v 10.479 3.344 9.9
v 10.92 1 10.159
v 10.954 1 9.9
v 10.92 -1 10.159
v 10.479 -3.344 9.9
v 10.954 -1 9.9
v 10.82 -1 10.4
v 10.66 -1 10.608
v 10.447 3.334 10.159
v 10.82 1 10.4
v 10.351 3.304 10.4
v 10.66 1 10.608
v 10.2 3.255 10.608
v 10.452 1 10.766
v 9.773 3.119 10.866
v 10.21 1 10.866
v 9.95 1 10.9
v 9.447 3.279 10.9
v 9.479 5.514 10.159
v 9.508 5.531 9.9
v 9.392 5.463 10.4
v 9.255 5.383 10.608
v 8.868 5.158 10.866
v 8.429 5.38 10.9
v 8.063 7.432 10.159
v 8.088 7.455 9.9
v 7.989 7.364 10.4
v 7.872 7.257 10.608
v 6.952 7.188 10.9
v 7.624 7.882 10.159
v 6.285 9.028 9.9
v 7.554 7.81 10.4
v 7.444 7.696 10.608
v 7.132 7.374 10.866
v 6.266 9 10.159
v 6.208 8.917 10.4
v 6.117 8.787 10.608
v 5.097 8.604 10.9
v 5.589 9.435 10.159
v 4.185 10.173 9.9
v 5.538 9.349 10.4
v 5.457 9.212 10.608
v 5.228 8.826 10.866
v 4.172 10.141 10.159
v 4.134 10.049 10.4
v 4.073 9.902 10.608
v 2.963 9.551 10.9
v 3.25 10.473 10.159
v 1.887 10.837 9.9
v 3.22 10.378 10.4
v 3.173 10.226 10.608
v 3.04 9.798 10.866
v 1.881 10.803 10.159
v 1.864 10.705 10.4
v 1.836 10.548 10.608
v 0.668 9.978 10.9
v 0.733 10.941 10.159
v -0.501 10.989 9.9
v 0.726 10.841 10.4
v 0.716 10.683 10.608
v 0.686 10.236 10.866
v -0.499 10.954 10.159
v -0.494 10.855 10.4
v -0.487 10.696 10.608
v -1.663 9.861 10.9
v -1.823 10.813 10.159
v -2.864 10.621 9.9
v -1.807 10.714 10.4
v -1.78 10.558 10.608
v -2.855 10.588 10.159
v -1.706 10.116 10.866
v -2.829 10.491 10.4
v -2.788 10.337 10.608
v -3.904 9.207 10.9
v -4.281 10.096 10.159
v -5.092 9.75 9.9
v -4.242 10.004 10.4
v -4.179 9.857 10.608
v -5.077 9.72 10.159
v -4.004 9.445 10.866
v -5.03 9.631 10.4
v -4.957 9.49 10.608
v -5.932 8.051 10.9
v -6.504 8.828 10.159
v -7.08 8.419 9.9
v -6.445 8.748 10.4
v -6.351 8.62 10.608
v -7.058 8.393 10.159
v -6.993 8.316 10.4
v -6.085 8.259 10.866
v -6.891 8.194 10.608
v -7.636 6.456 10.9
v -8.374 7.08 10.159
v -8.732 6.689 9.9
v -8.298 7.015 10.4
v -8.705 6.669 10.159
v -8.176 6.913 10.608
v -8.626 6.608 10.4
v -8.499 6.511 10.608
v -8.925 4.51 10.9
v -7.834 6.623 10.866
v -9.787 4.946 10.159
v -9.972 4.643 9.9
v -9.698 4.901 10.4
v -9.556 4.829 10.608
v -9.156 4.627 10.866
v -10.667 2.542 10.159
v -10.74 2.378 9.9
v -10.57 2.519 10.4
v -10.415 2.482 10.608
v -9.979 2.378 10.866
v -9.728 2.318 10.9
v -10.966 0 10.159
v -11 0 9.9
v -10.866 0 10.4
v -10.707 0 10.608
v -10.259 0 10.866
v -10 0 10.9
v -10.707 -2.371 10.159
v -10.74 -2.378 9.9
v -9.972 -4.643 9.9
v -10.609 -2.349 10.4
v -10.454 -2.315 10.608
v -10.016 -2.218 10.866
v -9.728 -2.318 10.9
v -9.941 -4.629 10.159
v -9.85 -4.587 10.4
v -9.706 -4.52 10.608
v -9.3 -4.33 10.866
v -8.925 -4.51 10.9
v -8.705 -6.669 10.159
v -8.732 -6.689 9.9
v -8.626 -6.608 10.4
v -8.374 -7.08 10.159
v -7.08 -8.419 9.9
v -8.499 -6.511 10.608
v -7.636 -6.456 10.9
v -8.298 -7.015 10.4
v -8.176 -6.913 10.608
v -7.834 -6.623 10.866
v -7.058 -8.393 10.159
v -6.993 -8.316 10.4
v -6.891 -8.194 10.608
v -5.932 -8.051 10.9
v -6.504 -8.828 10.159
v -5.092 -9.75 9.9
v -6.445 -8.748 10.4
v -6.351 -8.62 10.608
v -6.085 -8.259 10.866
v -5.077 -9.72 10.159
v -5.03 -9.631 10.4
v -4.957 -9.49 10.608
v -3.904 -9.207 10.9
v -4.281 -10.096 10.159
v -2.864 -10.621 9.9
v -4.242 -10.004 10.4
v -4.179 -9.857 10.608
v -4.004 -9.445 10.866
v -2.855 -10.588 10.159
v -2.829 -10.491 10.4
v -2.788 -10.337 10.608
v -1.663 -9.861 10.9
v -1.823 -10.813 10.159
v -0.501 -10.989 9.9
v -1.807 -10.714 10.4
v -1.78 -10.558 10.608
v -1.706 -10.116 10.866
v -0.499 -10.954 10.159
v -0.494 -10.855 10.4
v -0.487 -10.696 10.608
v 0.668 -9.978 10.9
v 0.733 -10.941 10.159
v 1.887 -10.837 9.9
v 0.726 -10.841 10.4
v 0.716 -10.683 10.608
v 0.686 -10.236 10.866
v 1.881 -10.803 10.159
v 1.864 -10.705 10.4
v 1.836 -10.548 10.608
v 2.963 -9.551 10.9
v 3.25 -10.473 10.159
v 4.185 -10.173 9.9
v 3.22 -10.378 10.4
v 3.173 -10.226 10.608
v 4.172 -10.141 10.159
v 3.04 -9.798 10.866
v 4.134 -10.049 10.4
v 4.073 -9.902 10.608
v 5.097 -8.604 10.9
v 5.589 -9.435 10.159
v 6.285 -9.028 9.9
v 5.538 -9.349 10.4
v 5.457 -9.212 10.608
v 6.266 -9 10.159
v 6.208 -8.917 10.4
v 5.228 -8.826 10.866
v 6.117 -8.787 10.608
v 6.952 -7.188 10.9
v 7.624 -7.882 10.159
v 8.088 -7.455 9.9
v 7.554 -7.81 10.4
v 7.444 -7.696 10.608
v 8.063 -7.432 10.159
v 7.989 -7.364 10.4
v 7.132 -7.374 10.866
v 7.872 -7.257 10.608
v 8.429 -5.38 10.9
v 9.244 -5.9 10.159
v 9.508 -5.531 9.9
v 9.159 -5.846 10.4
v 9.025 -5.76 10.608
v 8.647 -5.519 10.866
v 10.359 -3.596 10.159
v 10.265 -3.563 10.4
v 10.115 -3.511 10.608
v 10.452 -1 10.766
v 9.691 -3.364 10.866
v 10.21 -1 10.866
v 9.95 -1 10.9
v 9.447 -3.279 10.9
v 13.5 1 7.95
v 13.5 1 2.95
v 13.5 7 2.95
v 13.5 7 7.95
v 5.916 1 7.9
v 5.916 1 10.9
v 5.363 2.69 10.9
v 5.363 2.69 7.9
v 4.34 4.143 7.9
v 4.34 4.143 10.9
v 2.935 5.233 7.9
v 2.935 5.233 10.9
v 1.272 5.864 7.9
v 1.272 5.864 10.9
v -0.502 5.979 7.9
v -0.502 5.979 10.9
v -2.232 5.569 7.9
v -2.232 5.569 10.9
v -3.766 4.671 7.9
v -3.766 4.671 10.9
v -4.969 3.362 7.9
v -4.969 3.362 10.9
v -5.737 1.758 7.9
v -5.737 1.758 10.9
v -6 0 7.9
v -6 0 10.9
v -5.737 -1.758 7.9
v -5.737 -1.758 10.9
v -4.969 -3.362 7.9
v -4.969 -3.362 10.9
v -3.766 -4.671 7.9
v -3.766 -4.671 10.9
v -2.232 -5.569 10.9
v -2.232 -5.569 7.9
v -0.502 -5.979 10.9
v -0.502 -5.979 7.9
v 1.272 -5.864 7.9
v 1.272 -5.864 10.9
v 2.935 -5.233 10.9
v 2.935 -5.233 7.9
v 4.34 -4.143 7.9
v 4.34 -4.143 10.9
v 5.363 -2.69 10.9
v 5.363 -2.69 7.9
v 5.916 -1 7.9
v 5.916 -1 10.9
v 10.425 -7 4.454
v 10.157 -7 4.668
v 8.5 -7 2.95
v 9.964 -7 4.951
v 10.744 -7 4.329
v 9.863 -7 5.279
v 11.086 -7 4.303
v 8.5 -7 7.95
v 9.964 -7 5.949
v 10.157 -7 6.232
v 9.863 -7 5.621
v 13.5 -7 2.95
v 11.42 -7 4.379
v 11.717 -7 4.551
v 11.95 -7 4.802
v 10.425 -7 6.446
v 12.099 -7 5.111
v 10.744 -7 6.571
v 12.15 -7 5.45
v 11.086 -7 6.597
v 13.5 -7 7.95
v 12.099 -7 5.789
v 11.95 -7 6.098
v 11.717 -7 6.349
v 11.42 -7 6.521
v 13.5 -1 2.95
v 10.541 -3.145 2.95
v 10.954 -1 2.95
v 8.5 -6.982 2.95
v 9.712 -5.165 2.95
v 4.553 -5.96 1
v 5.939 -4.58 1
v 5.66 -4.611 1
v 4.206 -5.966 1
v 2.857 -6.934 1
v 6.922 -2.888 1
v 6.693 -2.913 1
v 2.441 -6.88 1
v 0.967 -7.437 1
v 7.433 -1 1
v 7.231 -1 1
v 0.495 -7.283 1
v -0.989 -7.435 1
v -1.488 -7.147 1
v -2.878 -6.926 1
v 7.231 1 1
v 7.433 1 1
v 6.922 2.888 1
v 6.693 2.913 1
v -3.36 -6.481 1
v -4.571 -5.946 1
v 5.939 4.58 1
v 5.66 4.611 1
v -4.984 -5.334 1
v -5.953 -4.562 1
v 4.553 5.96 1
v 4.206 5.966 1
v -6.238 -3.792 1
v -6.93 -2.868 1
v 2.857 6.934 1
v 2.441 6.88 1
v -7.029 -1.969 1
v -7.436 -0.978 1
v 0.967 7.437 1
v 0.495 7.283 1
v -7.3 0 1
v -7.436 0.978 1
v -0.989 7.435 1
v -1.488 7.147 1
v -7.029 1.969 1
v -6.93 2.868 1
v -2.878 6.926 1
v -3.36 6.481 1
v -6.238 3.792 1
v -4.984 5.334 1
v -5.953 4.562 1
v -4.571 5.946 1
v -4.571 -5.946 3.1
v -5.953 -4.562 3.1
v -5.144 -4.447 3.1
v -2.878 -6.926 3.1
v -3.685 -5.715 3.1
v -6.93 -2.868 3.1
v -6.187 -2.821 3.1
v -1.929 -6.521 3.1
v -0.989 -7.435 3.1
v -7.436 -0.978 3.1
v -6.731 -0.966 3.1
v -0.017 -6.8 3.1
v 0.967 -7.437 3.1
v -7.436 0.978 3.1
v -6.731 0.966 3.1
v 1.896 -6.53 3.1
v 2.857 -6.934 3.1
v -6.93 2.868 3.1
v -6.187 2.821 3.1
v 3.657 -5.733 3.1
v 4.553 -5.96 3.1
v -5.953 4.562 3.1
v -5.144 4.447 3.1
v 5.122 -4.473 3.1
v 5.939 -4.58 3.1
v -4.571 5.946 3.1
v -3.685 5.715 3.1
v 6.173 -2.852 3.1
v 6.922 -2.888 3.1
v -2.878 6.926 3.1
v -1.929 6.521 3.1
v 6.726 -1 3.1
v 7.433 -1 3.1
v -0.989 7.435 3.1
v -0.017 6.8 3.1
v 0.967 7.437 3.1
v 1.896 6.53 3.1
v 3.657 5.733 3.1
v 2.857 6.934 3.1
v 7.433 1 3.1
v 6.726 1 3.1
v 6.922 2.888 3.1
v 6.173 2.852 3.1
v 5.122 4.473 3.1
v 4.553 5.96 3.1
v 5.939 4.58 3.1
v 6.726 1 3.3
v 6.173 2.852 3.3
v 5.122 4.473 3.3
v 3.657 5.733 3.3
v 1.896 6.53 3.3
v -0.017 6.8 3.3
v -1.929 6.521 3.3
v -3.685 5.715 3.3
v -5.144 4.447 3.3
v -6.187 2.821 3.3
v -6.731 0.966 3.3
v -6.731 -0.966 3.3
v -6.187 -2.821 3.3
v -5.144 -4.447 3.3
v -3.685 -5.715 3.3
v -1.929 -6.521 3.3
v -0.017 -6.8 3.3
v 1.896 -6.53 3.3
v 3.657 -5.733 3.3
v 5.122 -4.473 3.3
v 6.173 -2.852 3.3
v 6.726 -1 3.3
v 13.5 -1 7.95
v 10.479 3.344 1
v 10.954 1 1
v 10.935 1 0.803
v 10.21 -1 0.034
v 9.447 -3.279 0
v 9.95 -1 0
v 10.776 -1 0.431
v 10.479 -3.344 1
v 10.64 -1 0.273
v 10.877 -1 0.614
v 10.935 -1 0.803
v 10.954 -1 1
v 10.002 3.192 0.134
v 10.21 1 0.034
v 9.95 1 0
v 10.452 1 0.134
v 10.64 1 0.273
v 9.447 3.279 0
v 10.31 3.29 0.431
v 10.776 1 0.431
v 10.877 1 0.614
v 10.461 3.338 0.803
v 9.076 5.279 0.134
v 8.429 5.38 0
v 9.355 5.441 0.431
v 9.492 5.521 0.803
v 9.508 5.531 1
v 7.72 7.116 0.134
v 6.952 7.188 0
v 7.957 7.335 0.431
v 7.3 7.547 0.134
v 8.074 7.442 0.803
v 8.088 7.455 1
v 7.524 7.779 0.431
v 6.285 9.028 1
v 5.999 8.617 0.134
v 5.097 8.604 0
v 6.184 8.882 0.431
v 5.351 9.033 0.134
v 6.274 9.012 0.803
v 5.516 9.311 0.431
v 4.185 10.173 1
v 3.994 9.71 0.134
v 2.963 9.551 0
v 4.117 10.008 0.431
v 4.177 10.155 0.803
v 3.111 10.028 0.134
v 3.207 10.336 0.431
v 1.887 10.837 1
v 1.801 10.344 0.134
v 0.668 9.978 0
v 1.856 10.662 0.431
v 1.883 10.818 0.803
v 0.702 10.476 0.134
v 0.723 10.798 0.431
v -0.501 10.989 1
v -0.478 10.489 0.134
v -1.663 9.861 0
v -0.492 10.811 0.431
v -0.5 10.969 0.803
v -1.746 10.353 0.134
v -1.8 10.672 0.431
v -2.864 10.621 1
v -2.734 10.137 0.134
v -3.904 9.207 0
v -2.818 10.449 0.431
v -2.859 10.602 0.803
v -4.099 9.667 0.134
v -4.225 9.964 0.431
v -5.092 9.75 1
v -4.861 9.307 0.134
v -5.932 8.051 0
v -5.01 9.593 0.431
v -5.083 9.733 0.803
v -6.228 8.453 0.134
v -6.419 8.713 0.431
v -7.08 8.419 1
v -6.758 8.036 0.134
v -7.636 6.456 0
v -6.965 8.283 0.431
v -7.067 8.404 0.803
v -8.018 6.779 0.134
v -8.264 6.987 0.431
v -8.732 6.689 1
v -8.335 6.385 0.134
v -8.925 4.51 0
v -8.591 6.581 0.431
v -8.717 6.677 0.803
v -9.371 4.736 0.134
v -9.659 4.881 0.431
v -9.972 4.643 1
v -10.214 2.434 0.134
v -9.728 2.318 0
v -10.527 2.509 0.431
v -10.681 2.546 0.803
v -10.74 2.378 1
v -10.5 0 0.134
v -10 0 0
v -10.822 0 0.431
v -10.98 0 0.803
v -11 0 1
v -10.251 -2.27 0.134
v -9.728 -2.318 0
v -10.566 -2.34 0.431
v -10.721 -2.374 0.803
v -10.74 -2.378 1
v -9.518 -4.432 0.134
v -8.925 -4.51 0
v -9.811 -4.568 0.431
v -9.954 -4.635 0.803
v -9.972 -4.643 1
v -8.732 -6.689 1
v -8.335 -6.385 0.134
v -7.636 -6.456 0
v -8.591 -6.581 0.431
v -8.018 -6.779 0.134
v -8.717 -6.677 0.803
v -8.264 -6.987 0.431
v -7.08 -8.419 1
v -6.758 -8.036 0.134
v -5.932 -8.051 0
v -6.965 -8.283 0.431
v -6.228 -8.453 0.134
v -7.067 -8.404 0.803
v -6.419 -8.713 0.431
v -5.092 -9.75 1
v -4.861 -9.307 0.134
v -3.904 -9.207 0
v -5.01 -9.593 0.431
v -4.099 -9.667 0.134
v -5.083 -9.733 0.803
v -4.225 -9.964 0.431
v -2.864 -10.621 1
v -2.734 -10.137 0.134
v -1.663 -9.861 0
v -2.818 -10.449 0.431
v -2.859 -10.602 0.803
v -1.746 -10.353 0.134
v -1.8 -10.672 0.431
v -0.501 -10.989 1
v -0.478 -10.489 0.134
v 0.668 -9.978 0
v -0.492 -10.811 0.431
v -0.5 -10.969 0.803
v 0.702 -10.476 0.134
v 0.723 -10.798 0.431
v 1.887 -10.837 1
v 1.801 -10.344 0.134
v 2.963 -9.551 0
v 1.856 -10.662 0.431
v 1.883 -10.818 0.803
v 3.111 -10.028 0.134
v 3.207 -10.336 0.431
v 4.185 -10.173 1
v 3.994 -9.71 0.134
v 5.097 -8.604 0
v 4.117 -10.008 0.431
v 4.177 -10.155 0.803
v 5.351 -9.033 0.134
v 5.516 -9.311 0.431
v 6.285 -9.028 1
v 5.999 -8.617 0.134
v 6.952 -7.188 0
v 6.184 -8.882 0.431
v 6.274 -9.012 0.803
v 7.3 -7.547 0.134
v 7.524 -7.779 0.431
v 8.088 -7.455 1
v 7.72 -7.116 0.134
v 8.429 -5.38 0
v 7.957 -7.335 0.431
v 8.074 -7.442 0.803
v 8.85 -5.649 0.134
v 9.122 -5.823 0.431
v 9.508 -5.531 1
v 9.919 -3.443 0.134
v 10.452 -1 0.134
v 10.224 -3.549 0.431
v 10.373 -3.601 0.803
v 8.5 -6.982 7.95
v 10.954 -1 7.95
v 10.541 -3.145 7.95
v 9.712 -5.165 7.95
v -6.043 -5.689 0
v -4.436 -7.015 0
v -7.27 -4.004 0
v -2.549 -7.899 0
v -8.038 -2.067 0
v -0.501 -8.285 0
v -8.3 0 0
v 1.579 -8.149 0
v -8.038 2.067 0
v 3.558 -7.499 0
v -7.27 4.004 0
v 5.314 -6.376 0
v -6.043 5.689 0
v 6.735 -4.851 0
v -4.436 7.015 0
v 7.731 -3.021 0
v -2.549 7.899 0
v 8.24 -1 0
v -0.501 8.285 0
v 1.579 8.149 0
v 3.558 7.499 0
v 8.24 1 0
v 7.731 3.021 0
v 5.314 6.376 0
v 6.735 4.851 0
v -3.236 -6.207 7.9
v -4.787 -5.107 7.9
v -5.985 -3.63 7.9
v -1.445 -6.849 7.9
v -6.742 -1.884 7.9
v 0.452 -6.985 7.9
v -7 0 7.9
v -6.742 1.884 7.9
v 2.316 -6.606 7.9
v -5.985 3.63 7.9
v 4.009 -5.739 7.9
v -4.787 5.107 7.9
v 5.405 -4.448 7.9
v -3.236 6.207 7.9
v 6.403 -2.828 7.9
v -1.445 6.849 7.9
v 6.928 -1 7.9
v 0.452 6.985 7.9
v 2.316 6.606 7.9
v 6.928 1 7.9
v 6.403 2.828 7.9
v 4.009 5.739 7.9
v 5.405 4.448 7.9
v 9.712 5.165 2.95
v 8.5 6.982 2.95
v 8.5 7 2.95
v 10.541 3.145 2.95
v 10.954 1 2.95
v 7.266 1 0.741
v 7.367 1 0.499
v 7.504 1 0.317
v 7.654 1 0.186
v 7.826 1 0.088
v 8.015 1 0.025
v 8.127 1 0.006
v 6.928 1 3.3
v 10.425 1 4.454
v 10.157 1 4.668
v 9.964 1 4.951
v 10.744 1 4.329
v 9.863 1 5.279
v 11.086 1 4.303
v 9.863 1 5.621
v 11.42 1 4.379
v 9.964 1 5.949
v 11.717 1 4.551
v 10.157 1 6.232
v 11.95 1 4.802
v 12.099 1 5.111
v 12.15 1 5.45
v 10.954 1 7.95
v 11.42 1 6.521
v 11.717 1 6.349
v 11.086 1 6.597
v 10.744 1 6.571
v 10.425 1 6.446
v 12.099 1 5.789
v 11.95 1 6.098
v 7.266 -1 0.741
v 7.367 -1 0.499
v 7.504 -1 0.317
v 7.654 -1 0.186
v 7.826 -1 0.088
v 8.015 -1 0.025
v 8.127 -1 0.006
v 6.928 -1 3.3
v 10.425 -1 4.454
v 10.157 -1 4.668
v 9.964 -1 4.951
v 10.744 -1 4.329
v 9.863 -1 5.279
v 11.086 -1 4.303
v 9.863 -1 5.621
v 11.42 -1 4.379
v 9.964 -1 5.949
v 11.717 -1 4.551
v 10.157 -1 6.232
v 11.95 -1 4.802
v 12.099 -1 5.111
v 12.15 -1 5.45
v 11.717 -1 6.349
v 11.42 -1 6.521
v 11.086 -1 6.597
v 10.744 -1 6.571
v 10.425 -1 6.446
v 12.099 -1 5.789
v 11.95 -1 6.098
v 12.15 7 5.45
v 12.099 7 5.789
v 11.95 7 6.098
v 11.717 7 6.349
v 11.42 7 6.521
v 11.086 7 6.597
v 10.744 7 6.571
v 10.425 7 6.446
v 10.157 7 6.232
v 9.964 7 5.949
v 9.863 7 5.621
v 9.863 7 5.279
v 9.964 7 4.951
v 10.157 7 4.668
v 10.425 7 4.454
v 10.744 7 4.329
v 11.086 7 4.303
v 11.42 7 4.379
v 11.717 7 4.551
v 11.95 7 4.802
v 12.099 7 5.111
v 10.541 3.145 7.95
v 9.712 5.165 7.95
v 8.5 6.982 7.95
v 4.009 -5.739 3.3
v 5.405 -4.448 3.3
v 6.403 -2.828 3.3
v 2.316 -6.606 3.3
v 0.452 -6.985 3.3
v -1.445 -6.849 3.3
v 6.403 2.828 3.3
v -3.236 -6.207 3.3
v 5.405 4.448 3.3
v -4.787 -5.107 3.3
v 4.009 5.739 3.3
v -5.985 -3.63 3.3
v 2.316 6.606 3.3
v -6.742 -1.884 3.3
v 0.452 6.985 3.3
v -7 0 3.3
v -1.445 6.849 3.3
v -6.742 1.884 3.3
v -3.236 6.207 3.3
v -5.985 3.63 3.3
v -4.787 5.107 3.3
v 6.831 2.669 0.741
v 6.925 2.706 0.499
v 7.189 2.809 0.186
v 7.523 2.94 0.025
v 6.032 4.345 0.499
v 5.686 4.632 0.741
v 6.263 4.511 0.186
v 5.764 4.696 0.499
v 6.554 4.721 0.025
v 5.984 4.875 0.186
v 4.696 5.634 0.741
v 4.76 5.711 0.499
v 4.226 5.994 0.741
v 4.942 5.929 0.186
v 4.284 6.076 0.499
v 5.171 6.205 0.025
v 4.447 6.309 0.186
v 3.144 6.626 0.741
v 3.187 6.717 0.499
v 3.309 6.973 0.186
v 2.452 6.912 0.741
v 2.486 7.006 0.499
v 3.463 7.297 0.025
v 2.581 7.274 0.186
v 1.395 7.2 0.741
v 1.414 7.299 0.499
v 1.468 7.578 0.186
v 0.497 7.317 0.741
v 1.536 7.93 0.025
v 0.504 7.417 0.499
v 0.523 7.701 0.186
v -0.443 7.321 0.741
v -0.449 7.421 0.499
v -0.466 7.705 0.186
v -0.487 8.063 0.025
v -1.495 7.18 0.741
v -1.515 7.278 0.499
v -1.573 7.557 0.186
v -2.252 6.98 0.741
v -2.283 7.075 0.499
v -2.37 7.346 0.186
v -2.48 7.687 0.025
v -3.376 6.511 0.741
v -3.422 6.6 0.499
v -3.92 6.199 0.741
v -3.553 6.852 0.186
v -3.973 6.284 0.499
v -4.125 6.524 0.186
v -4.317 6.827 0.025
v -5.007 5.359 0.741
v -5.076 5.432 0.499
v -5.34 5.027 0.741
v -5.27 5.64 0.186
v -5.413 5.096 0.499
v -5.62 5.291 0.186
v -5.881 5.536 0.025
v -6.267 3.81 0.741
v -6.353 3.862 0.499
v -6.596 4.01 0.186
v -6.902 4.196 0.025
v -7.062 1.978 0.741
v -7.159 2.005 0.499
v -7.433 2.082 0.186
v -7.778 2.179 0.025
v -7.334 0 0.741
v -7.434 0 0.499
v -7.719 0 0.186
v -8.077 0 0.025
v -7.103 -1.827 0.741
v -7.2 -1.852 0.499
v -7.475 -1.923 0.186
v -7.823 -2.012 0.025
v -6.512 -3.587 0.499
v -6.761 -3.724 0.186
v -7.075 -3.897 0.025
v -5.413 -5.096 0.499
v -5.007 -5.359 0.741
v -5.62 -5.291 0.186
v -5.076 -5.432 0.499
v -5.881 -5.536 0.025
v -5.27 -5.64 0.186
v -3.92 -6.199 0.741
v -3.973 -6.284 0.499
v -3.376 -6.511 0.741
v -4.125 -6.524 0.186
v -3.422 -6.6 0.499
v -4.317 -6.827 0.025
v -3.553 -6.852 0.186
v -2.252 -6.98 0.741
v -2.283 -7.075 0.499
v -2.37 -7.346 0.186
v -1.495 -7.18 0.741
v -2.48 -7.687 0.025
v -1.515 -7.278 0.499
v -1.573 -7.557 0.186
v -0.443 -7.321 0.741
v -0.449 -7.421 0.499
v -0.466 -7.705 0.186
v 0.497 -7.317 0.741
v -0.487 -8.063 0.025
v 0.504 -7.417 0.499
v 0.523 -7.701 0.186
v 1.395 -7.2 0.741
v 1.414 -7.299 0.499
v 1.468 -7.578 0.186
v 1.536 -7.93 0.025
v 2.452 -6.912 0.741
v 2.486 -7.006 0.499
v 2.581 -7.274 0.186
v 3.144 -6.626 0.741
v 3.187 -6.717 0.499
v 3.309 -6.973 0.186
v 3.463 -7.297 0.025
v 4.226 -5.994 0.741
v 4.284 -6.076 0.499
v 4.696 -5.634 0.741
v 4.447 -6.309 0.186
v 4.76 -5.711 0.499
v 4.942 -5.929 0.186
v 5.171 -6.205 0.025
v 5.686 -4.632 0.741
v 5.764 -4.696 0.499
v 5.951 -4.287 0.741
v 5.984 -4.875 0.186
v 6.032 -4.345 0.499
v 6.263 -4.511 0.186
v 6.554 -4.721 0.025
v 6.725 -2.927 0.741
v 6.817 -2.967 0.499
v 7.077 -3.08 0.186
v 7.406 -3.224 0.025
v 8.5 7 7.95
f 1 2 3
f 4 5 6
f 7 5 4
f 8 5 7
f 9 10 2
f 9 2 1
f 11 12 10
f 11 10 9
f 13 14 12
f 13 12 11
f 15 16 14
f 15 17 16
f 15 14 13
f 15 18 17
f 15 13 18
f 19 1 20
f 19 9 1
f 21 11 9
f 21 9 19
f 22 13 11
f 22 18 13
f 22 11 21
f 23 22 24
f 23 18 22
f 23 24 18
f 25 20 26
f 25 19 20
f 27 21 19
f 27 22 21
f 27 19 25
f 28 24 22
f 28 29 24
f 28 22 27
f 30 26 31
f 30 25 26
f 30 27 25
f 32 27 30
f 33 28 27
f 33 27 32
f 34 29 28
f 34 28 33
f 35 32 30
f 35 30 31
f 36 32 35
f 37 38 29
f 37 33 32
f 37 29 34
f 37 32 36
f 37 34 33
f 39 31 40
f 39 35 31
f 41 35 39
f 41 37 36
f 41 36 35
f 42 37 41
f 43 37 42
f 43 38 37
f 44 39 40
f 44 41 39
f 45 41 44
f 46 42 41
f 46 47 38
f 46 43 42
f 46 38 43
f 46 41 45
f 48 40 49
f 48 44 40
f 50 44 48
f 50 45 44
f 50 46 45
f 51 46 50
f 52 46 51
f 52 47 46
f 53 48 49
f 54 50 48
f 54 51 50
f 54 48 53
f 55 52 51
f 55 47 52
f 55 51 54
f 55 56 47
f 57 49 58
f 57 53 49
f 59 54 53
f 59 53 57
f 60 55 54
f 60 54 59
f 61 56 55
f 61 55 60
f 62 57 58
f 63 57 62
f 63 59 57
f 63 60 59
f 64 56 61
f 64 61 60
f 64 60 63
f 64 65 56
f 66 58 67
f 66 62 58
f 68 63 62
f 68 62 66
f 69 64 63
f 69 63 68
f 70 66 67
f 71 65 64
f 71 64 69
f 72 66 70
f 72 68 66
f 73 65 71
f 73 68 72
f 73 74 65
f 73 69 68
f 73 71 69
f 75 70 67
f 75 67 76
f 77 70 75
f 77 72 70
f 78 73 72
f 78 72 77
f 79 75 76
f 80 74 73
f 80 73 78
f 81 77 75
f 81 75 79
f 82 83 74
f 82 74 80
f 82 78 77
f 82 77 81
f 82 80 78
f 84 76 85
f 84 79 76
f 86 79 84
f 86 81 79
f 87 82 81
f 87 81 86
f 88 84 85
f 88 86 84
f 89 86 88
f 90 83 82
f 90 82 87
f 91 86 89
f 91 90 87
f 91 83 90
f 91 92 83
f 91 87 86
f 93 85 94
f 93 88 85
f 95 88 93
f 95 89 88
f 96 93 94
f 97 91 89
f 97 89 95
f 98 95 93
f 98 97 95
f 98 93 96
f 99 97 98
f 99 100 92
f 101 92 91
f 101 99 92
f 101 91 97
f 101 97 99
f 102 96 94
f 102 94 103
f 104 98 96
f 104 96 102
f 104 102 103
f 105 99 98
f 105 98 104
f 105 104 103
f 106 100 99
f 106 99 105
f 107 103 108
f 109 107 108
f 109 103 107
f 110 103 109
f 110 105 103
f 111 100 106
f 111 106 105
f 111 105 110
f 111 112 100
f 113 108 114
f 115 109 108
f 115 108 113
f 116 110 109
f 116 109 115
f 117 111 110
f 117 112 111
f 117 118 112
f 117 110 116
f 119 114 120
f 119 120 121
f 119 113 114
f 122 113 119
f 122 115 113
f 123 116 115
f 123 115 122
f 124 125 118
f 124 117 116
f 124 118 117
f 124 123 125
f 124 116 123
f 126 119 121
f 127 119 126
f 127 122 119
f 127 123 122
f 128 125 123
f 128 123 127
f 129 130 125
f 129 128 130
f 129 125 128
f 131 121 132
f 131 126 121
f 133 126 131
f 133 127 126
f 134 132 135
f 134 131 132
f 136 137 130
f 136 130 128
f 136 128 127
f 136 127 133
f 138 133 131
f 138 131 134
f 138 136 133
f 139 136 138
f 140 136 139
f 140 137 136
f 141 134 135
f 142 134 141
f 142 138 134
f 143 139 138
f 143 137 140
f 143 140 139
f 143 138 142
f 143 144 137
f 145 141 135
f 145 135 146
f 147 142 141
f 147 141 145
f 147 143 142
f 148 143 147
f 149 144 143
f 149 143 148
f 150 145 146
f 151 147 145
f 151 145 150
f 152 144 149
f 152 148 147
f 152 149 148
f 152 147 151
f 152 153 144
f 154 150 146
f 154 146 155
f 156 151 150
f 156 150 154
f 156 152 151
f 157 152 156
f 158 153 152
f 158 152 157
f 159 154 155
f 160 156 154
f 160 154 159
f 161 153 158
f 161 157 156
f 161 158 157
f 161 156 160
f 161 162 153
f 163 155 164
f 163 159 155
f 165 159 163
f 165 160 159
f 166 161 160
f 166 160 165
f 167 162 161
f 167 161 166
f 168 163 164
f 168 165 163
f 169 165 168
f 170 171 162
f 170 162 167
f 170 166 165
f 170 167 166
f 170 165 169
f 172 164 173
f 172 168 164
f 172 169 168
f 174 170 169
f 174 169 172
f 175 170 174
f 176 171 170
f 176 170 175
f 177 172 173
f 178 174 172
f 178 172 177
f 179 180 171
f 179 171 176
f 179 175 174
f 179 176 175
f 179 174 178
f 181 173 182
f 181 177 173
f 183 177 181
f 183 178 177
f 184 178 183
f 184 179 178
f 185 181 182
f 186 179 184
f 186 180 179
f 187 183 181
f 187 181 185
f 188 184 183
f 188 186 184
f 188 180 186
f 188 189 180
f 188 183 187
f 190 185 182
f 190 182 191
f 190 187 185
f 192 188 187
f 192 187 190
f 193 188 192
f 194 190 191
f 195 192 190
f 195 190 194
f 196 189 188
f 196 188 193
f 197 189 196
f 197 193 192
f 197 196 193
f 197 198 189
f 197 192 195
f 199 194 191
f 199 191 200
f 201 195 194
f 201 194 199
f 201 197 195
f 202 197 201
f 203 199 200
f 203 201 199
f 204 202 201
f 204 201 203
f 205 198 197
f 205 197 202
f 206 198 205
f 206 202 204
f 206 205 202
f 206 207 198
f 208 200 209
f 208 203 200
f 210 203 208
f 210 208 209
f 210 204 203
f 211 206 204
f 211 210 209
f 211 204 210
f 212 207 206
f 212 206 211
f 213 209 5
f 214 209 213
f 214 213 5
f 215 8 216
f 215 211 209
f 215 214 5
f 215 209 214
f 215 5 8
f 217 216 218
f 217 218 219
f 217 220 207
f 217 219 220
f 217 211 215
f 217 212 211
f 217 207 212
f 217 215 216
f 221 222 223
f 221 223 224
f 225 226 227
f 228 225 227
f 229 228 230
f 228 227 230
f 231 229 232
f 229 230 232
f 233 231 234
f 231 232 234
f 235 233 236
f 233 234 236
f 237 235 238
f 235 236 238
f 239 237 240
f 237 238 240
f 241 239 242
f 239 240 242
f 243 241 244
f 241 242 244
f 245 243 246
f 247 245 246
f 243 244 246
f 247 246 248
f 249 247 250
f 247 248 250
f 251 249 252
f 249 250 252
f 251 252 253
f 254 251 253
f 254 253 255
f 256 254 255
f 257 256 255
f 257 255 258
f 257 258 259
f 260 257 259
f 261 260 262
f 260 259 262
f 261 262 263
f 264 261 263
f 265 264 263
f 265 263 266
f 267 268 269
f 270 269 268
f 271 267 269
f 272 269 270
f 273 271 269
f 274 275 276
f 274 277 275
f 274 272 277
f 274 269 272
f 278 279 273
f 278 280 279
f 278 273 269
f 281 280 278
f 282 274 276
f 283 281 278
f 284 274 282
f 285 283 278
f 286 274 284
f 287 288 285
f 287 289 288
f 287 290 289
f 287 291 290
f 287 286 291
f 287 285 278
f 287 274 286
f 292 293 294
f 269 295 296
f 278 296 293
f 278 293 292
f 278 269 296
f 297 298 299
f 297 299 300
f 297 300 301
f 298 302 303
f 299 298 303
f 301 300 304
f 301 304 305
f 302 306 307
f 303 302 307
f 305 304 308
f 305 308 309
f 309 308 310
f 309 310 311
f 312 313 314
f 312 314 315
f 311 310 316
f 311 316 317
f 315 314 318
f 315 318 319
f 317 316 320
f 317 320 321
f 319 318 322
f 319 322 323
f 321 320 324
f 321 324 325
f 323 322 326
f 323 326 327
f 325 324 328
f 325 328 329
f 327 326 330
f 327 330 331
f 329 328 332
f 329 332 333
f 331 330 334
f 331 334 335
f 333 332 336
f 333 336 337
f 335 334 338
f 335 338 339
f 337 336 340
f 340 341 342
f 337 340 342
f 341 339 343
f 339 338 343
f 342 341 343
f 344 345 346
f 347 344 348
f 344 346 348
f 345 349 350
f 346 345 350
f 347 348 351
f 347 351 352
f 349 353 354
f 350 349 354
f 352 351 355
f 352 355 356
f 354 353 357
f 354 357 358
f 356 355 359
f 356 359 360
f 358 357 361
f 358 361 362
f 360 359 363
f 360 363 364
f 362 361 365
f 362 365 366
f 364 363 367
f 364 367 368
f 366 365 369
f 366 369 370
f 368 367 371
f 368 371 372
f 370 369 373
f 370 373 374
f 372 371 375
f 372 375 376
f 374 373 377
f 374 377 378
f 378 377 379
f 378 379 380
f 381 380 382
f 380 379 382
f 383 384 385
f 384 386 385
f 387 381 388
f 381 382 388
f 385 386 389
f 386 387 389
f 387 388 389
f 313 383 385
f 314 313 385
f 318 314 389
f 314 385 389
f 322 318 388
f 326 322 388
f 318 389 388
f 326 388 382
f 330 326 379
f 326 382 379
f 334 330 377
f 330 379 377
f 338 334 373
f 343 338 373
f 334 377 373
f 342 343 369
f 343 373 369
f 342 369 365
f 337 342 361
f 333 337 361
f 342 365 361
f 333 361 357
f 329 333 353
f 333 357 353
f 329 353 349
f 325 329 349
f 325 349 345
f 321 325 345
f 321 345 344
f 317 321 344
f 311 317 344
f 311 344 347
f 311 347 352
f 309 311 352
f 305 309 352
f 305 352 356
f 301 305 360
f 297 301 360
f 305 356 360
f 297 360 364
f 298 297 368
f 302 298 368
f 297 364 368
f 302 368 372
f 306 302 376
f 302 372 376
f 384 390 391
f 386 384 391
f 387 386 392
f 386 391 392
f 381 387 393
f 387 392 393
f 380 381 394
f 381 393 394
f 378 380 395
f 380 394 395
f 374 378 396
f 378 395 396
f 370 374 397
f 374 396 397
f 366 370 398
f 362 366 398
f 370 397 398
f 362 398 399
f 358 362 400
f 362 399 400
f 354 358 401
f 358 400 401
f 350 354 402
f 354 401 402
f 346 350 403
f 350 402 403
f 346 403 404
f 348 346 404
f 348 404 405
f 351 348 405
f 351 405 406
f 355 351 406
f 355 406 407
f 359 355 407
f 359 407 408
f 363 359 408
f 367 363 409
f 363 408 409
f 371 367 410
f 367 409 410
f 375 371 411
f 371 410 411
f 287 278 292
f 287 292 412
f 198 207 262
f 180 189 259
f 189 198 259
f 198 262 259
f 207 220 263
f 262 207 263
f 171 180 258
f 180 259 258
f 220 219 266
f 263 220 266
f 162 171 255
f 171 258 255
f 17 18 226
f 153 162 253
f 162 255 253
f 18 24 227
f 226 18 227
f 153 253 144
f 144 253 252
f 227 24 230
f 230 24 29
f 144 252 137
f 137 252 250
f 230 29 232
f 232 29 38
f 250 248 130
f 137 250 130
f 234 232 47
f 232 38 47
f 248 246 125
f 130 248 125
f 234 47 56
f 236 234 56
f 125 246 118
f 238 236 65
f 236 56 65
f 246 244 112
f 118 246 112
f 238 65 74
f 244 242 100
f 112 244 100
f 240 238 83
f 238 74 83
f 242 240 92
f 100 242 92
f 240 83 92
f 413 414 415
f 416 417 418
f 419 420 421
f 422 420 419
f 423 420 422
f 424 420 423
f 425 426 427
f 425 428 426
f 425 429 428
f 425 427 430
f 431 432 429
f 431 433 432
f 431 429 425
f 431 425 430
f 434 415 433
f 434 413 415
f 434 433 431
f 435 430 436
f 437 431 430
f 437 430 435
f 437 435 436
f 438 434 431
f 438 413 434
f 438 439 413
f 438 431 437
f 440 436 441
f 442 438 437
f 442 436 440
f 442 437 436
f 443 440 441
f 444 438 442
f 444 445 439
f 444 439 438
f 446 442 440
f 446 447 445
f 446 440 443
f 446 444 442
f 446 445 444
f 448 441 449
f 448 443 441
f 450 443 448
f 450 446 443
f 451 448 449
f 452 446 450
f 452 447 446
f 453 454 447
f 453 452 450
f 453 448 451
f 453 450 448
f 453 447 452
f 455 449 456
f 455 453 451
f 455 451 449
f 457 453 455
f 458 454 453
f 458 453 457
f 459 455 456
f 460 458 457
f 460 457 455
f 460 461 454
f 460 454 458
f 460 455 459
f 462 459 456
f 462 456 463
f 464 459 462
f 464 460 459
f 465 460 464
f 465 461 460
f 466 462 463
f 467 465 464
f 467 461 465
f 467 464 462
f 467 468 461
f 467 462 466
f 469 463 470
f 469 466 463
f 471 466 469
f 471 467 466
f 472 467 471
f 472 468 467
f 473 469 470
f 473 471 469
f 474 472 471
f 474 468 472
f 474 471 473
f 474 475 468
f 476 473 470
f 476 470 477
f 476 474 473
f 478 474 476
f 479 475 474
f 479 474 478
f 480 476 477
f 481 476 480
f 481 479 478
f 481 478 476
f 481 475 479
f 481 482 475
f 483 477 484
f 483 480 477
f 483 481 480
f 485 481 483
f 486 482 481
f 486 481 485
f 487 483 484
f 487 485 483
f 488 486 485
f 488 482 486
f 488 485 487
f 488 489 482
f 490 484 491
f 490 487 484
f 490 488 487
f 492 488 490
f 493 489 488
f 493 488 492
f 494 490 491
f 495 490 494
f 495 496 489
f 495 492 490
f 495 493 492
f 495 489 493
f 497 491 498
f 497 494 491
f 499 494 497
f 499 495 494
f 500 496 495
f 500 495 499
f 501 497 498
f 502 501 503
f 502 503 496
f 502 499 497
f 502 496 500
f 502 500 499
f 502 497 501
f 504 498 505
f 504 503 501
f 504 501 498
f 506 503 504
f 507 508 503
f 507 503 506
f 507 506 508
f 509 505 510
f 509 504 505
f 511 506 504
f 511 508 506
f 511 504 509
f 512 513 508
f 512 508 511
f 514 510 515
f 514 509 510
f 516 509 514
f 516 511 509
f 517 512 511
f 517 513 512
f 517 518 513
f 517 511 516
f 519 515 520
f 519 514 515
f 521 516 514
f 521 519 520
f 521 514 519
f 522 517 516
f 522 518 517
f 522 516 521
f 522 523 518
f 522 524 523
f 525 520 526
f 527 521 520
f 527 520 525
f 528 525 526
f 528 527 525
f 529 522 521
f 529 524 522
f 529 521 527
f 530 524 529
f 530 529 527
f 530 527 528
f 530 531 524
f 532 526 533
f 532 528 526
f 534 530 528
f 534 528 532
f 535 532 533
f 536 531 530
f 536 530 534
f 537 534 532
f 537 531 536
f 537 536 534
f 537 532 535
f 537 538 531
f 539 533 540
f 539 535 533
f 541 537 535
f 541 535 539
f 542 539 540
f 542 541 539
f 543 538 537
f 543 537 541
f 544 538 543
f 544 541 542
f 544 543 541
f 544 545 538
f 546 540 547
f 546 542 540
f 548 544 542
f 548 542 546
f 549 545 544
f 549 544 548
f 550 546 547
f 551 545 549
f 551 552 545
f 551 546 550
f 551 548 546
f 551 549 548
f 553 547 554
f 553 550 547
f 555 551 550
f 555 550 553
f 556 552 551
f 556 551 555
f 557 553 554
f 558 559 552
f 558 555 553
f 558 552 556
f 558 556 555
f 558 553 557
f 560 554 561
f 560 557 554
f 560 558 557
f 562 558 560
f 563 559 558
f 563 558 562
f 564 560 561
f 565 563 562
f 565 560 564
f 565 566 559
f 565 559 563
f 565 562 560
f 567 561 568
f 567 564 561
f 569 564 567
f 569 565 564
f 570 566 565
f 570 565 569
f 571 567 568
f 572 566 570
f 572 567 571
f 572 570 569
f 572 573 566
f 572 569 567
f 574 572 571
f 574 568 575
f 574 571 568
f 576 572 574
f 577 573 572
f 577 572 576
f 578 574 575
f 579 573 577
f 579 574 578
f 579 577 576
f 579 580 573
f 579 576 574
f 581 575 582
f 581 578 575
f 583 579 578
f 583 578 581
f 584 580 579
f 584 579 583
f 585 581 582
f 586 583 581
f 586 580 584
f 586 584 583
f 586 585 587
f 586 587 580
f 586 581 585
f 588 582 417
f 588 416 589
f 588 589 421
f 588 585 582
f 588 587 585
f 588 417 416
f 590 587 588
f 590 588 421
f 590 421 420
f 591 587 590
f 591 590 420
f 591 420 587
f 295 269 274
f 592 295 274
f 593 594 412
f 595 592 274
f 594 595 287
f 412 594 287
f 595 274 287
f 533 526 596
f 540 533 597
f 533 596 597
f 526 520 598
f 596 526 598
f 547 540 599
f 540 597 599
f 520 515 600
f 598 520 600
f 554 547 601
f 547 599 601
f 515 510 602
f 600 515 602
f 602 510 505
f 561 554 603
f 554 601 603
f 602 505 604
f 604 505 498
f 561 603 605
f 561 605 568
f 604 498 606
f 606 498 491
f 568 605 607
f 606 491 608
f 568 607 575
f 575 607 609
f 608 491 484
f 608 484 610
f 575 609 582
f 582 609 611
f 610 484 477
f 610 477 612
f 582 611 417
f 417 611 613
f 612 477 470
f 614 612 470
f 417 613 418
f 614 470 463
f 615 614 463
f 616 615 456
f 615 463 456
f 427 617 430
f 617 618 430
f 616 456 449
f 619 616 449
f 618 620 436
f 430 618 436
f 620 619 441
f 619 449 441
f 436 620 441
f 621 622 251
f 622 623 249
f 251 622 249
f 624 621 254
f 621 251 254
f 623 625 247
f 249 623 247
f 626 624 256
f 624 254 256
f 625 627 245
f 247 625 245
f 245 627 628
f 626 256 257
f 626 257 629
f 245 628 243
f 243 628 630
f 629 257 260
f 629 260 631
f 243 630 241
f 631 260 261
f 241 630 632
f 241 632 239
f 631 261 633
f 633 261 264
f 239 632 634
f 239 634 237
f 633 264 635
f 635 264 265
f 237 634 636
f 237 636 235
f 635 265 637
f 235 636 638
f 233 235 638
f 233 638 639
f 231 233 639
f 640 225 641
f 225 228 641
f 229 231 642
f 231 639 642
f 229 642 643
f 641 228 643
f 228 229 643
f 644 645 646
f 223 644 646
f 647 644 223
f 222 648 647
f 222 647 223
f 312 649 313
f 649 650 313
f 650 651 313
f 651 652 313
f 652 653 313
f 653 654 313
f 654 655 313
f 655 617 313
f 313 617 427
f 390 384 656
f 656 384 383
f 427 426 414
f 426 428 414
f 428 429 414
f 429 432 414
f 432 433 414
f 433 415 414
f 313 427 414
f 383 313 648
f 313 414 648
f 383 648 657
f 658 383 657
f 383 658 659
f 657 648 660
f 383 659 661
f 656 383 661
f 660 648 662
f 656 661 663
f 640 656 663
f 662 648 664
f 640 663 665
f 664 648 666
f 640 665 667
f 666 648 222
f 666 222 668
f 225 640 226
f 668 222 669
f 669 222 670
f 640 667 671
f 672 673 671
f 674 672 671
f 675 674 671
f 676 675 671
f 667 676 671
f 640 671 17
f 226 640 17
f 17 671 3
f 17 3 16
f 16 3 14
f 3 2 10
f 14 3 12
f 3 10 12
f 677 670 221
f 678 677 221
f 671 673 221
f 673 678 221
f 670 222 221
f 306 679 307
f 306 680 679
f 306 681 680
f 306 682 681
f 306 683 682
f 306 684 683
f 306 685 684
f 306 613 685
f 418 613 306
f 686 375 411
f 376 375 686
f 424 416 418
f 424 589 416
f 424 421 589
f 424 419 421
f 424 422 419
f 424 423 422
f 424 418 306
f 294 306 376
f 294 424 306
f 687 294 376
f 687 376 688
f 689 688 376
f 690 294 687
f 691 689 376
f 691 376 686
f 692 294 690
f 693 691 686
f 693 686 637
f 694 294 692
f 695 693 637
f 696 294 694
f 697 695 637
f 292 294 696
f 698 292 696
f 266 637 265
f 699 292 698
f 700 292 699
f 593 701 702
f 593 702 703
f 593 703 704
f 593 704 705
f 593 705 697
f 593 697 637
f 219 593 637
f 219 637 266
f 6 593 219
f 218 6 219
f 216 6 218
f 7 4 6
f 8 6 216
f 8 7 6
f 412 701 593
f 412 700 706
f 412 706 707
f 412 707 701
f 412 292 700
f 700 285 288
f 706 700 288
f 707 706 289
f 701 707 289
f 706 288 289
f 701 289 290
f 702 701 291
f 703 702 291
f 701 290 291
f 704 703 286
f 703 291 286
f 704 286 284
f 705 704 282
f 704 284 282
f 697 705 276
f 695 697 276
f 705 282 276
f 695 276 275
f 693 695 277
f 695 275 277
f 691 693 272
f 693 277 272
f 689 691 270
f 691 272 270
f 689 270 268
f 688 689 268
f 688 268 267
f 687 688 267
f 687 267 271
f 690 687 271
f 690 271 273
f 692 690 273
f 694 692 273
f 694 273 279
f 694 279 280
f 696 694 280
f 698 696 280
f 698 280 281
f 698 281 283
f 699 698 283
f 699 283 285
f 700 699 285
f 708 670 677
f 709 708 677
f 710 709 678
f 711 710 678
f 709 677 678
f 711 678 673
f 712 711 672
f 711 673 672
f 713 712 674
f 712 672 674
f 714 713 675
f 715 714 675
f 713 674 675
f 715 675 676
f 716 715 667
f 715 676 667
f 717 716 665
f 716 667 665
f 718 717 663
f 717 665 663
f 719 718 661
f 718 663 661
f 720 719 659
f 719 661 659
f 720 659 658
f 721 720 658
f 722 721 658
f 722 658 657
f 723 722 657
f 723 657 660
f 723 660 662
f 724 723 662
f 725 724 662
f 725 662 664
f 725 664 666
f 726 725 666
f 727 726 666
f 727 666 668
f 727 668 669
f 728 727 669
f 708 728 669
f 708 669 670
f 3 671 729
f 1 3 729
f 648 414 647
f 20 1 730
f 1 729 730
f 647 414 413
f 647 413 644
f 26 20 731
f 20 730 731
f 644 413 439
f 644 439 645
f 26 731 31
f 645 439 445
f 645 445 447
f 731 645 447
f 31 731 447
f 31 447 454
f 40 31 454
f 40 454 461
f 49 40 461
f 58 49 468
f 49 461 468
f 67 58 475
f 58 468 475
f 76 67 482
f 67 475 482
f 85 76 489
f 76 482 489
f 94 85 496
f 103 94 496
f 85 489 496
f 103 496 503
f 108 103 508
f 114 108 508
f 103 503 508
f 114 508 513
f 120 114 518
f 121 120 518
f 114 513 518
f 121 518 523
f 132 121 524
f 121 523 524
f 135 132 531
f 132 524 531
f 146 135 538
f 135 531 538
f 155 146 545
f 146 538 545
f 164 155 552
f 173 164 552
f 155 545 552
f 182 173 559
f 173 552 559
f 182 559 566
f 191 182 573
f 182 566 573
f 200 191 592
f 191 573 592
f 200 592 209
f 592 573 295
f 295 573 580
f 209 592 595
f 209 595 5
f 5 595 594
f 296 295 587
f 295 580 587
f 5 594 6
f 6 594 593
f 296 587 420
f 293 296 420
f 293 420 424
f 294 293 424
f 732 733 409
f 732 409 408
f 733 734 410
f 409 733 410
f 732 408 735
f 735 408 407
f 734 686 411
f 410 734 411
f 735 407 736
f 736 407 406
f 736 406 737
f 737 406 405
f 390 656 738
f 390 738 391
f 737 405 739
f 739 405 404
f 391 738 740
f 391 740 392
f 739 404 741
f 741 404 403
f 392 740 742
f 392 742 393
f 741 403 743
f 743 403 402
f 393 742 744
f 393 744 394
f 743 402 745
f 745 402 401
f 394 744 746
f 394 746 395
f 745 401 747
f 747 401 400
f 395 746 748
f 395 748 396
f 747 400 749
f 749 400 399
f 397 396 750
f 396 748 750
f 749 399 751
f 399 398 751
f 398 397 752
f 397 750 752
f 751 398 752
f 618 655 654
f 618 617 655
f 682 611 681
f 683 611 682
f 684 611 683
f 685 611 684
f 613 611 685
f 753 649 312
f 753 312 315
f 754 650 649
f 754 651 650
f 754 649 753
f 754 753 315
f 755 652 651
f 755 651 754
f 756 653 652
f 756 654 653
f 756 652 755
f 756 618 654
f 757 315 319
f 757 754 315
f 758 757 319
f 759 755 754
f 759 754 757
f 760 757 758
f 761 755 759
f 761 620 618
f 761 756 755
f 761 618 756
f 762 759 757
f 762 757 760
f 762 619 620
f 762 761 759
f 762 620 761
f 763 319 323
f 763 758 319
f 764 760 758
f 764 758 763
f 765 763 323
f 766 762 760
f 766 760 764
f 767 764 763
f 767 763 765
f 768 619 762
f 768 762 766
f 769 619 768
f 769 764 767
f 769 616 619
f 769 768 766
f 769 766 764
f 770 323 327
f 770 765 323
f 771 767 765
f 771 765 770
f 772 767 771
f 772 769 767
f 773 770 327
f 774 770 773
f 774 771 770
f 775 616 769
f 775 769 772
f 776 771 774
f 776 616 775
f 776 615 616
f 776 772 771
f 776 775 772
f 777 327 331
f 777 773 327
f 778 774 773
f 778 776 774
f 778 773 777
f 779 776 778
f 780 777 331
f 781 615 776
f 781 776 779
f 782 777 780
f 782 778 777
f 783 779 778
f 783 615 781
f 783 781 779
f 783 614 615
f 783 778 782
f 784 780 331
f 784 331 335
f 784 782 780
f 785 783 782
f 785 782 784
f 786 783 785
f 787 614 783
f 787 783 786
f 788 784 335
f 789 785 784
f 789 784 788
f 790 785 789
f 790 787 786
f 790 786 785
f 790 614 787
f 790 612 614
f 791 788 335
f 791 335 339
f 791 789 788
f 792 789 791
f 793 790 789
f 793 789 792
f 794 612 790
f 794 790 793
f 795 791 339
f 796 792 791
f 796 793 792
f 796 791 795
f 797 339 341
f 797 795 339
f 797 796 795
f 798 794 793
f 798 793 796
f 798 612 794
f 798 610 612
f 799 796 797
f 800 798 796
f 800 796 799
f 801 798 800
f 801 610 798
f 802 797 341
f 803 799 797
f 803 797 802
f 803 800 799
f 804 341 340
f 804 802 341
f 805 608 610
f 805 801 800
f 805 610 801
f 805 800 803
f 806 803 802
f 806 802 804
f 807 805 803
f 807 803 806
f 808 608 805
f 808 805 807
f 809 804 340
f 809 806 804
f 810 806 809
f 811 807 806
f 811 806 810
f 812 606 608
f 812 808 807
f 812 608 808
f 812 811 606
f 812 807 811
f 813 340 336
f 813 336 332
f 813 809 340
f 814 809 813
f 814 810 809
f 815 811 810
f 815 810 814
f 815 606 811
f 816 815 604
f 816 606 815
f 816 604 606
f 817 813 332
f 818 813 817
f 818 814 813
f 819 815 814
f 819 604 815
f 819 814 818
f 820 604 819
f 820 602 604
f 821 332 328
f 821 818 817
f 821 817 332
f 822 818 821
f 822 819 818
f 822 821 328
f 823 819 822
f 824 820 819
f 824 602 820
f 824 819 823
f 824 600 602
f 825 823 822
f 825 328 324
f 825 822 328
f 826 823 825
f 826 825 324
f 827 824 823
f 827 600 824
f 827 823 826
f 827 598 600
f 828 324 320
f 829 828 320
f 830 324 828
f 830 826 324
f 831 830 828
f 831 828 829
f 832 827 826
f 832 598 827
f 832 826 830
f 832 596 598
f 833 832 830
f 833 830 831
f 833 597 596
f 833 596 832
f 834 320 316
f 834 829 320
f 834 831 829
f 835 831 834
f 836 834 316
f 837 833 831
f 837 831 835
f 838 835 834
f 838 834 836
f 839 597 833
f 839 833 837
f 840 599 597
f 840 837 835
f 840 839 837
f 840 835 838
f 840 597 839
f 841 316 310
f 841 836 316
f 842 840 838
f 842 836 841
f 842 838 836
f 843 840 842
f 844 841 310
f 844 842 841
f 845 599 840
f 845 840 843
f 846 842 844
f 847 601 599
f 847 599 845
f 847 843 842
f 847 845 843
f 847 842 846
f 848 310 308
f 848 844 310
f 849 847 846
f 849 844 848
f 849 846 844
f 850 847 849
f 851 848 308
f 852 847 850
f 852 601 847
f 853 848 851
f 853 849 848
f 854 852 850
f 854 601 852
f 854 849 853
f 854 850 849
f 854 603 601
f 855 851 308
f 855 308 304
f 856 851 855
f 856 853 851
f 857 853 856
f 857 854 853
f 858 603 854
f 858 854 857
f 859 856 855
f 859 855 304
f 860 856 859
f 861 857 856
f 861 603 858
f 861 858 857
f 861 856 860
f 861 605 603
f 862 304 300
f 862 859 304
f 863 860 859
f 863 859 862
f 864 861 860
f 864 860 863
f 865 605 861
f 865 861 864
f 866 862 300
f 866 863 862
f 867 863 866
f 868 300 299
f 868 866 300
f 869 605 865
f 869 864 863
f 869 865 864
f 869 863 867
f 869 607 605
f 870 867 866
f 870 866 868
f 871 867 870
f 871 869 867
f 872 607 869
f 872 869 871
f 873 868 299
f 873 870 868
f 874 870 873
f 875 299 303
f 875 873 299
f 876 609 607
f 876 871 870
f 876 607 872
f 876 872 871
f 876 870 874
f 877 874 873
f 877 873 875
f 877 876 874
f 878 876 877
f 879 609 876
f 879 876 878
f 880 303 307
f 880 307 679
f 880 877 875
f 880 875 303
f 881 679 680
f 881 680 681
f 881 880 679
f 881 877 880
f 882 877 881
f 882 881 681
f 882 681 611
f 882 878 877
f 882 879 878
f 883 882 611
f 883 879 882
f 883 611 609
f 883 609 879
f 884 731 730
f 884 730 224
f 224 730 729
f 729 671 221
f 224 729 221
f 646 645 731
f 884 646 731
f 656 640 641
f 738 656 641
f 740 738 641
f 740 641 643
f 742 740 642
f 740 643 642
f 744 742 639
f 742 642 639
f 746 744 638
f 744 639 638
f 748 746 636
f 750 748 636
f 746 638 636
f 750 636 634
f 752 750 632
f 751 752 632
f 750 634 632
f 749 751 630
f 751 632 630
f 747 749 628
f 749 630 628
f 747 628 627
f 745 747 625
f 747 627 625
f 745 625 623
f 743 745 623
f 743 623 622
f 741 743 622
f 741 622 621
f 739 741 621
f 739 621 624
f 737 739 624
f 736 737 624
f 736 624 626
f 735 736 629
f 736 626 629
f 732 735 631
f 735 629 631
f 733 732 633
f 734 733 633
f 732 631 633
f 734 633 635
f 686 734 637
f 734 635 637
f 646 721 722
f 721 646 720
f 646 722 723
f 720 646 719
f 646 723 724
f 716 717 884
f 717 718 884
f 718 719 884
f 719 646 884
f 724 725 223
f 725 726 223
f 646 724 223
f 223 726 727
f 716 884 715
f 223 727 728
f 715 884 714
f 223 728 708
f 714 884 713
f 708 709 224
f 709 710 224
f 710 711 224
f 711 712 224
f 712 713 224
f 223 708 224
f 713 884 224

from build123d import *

# Parameters (mm, degrees)
SKETCH001_W     = 5
SKETCH001_H     = 5
PAD_DEPTH       = 7
SKETCH002_W     = 12
SKETCH002_H     = 2
POCKET_DEPTH    = 9
SKETCH003_R     = 1.15
POCKET001_DEPTH = 18.001


with BuildPart() as part:
    # Sketch → Revolution (revolve)
    with BuildSketch(Plane.XZ):
        with BuildLine():
            Line((7.3, 1), (7.5, 1))
            Line((7.5, 1), (7.5, 3.1))
            Line((7.5, 3.1), (6.8, 3.1))
            Line((6.8, 3.1), (6.8, 3.3))
            Line((6.8, 3.3), (7, 3.3))
            Line((7, 3.3), (7, 7.9))
            Line((7, 7.9), (6, 7.9))
            Line((6, 7.9), (6, 10.9))
            Line((6, 10.9), (10, 10.9))
            ThreePointArc((11, 9.9), (10.707107, 10.607107), (10, 10.9))
            Line((11, 9.9), (11, 1))
            ThreePointArc((10, 0), (10.707107, 0.292893), (11, 1))
            Line((10, 0), (8.3, 0))
            ThreePointArc((7.3, 1), (7.592893, 0.292893), (8.3, 0))
        make_face()
    revolve(axis=Axis((0, 0, 0), (0, 0, 1)))

    # Sketch001 → Pad (new body, symmetric)
    with BuildSketch(Plane.XZ):
        with Locations((11, 5.45)):
            Rectangle(SKETCH001_W, SKETCH001_H)
    extrude(amount=PAD_DEPTH, both=True)

    # Sketch002 (on Face13 of Pad) → Pocket (cut)
    with BuildSketch(Plane(origin=(13.5, 0, 0), x_dir=(0, 0, 1), z_dir=(1, 0, 0))):
        with Locations((6, 0)):
            Rectangle(SKETCH002_W, SKETCH002_H)
    extrude(amount=-POCKET_DEPTH, mode=Mode.SUBTRACT)

    # Sketch003 (on Face25 of Pocket) → Pocket001 (cut, through all)
    with BuildSketch(Plane.XZ.offset(7)):
        with Locations((11, 5.45)):
            Circle(SKETCH003_R)
    extrude(amount=-POCKET001_DEPTH, mode=Mode.SUBTRACT)


solid = part.part
